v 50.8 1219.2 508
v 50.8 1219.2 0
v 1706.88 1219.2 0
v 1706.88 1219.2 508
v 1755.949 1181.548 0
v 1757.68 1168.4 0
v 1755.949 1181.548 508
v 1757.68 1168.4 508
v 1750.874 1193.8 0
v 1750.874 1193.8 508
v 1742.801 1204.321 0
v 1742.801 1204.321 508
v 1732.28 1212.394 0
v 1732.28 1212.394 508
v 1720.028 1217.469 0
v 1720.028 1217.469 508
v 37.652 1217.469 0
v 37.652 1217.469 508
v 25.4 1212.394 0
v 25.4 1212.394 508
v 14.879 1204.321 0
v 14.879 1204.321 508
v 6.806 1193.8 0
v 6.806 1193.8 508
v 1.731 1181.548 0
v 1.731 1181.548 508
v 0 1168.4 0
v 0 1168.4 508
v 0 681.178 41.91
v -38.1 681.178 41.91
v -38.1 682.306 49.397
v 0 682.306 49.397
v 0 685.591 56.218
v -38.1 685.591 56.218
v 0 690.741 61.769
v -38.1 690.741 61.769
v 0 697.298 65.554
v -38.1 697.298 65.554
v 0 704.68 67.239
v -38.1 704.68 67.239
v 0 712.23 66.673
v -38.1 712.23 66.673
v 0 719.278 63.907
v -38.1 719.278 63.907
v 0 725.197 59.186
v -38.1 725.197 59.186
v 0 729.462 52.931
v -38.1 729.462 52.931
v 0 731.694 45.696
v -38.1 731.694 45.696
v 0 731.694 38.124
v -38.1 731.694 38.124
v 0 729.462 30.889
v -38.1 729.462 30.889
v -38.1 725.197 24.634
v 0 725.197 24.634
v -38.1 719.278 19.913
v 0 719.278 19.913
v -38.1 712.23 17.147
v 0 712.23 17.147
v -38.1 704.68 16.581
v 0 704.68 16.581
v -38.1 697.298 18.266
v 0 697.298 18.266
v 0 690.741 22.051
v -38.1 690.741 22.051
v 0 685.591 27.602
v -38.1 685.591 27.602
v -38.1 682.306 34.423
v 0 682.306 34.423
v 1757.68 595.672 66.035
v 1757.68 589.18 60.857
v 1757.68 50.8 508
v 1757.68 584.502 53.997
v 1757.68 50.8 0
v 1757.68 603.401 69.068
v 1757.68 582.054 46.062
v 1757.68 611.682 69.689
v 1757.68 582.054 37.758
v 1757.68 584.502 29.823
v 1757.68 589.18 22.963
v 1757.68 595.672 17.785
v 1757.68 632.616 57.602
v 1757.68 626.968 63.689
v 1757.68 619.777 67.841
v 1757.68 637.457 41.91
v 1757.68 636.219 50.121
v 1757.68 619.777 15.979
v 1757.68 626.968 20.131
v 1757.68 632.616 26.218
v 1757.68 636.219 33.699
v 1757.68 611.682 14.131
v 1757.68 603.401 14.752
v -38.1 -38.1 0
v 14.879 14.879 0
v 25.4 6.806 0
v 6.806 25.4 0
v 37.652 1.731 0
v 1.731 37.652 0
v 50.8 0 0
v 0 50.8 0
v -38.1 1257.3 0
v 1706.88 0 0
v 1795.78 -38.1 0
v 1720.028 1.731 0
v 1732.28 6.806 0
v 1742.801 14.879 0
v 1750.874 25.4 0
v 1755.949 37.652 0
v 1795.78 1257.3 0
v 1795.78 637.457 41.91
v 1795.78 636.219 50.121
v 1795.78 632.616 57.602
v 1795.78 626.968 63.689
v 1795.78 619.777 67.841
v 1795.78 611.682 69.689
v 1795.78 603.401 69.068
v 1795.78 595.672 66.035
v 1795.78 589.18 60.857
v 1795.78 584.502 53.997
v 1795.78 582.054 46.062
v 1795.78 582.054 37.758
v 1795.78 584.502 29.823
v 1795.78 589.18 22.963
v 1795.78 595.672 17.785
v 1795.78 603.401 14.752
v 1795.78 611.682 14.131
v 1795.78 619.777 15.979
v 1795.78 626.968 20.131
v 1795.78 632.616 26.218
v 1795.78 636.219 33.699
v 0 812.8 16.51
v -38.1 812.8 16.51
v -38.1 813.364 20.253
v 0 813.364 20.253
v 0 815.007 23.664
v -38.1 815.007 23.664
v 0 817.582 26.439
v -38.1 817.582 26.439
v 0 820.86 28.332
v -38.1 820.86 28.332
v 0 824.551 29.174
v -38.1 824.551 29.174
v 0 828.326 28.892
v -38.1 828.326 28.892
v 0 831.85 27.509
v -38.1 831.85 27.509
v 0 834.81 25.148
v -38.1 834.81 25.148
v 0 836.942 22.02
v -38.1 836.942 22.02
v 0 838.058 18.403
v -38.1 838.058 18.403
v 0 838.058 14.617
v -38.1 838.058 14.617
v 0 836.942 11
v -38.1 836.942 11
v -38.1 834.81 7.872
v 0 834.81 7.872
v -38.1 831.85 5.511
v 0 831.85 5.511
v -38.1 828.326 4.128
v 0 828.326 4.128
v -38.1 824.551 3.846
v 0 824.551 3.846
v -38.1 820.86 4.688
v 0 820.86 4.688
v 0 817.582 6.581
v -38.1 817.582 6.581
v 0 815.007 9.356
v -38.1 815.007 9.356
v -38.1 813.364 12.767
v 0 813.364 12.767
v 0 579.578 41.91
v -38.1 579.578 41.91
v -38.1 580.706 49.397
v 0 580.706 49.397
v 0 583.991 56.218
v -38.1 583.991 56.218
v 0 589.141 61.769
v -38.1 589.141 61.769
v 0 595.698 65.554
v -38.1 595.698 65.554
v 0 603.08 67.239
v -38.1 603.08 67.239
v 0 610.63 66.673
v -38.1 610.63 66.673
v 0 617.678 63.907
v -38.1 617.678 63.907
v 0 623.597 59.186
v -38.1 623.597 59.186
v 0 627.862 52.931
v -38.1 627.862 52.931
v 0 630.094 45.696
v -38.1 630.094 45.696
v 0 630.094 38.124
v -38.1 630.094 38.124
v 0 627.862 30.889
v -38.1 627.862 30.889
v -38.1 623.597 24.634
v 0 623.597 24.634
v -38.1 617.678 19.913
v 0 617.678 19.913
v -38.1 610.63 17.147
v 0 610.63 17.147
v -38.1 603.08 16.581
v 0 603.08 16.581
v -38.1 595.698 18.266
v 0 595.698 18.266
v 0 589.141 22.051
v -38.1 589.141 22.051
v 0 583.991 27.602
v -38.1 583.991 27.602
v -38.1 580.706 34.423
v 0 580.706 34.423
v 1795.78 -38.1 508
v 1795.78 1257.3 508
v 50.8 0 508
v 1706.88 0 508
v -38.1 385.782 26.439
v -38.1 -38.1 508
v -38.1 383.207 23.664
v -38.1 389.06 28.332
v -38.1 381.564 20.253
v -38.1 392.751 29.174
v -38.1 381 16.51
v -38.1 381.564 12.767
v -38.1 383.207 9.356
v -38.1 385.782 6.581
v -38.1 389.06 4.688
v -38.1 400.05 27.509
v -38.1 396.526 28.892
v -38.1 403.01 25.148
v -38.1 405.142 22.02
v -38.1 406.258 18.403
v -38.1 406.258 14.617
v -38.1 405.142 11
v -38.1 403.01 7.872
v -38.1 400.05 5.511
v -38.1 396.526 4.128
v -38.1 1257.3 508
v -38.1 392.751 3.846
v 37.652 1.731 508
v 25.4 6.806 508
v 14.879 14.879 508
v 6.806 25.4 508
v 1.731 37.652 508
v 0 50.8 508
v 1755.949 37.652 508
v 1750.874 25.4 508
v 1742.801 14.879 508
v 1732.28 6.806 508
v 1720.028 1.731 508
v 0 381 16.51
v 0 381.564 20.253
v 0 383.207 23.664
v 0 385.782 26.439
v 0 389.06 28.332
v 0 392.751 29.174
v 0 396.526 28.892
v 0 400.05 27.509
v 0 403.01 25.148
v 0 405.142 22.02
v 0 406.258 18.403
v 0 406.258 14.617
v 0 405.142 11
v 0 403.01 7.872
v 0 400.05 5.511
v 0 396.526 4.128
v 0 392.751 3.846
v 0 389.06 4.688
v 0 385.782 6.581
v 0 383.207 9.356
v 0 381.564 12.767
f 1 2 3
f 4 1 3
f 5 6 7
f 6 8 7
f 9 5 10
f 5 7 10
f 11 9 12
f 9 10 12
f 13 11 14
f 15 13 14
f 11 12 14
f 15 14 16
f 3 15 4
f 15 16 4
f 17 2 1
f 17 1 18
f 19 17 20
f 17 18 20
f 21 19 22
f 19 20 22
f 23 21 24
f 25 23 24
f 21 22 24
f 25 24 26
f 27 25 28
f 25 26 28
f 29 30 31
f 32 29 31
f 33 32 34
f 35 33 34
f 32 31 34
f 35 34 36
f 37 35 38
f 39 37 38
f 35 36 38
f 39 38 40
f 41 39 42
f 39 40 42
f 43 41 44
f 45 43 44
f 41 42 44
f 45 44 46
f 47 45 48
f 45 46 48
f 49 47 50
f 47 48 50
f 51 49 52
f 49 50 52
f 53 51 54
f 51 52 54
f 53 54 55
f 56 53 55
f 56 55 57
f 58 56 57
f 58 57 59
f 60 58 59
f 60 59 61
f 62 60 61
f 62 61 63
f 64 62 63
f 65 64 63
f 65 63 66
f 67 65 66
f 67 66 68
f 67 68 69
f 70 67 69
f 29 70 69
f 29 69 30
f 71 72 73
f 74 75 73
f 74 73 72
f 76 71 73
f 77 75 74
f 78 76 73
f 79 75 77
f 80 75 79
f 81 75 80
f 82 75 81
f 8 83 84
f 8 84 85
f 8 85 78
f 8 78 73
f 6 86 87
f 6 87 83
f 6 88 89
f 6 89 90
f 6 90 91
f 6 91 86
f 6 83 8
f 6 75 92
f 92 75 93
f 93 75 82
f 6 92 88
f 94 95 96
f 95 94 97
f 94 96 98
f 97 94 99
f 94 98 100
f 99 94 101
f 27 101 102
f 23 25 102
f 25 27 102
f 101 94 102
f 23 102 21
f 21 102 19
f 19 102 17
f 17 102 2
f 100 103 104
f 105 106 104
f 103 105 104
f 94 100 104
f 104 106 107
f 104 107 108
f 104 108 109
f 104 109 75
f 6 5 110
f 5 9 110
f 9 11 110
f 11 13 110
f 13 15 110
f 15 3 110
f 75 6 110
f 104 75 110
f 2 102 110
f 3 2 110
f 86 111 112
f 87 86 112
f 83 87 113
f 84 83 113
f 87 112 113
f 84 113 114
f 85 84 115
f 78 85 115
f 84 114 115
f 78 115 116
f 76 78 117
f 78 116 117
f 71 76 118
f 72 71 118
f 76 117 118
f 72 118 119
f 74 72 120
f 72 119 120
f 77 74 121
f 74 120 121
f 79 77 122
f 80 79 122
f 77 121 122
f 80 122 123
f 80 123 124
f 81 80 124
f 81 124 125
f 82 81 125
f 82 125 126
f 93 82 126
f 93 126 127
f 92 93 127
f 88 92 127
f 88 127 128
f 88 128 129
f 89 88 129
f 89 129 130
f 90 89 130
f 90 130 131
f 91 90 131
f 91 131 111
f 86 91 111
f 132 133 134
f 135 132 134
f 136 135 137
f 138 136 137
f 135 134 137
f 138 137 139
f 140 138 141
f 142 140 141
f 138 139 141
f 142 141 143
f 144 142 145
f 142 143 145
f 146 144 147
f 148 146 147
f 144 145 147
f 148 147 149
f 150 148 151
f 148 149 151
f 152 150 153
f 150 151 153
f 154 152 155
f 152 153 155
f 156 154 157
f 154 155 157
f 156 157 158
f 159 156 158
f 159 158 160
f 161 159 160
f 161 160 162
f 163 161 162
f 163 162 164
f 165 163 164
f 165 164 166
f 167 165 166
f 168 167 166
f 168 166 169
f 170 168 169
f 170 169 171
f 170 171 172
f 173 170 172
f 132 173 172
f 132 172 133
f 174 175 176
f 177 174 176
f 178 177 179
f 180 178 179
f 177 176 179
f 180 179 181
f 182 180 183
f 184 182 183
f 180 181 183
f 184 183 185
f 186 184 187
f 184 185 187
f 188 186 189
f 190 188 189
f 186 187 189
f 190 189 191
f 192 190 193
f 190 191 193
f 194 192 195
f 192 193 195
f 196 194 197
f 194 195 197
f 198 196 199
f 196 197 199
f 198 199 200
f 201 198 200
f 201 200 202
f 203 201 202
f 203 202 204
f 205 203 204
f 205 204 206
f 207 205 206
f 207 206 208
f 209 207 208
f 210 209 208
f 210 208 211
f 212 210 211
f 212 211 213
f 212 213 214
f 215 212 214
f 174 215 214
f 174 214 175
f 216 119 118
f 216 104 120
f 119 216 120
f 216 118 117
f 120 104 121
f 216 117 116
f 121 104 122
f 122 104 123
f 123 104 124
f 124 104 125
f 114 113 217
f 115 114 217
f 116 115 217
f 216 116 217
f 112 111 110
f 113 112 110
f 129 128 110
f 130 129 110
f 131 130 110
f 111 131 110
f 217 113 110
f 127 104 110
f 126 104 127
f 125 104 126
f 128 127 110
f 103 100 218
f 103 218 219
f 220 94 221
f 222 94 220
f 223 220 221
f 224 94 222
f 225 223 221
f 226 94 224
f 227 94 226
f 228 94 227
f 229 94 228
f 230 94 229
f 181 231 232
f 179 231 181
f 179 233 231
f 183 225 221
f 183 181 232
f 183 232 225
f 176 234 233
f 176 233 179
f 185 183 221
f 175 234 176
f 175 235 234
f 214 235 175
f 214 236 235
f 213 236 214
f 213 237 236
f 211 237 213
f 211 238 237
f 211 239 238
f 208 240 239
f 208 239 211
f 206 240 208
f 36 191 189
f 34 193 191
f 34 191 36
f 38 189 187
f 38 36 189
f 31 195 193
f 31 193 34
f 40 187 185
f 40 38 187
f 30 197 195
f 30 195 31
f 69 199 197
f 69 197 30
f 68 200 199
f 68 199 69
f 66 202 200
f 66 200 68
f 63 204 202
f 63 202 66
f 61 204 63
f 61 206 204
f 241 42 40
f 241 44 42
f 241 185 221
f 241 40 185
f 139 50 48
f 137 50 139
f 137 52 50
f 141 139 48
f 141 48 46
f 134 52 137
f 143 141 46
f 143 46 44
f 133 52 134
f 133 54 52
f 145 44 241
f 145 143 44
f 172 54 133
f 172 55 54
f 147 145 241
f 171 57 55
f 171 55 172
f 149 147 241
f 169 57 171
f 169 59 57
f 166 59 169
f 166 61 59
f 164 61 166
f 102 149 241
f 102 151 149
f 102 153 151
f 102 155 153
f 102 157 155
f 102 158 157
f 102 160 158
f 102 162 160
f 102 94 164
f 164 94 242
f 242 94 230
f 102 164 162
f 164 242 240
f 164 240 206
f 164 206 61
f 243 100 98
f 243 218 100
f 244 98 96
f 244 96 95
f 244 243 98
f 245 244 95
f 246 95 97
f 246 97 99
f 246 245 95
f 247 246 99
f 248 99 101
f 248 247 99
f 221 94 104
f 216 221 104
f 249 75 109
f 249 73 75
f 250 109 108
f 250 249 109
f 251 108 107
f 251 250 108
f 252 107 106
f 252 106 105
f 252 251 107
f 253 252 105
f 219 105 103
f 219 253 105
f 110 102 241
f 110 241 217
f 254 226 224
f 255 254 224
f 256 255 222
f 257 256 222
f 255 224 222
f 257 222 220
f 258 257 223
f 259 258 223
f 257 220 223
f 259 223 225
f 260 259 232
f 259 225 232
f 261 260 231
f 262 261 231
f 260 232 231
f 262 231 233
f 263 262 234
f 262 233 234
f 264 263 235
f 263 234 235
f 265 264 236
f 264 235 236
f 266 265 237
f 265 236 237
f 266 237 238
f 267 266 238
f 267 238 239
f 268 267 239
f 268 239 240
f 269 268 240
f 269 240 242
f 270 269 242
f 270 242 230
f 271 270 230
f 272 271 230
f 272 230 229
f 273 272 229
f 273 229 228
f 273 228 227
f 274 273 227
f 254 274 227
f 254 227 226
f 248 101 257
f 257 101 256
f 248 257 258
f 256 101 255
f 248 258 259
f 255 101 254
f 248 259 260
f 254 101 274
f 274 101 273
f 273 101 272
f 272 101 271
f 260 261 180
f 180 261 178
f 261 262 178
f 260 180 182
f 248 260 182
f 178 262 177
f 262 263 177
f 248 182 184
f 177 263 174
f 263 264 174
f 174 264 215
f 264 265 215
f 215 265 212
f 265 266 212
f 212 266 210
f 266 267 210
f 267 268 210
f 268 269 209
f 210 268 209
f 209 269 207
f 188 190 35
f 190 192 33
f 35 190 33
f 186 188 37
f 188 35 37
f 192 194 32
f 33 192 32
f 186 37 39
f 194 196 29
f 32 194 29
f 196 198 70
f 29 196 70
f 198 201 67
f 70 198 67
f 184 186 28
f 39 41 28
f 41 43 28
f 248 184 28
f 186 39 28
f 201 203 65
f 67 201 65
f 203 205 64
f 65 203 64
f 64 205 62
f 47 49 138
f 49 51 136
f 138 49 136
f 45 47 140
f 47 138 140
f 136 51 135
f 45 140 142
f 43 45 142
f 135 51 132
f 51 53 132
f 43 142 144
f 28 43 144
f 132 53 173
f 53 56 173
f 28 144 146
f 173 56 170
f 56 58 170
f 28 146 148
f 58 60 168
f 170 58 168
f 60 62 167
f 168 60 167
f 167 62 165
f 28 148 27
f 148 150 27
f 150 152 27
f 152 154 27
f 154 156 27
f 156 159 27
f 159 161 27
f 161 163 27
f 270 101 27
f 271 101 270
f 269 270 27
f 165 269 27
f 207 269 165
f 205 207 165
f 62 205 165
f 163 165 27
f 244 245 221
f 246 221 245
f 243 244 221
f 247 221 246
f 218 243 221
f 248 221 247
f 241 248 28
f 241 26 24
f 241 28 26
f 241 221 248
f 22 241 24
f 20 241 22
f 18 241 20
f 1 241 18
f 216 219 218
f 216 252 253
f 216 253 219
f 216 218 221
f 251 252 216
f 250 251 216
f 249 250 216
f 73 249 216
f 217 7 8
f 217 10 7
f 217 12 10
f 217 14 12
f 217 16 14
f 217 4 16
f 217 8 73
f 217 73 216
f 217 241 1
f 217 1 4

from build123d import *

# Parameters (mm, degrees)
F0_W      = 1833.88
F0_H      = 1295.4
F0_W_2    = 1757.68
F0_H_2    = 1219.2
F1_DEPTH  = 508
F2_R      = 50.8
F3_R      = 50.8
F4_R      = 50.8
F5_R      = 50.8
F6_R      = 25.4
F8_DEPTH  = 50.8
F7_R      = 12.7
F9_DEPTH  = 50.8
F10_R     = 27.856725
F11_DEPTH = 50.8


with BuildPart() as f1:
    # F0 (on Top) → F1 (new body)
    with BuildSketch(Plane.XY):
        with Locations((878.84, 609.6)):
            Rectangle(F0_W, F0_H)
        with Locations((878.84, 609.6)):
            Rectangle(F0_W_2, F0_H_2, mode=Mode.SUBTRACT)
    extrude(amount=F1_DEPTH)

    # F2
    f2_edges = [f1.edges().sort_by_distance(p)[0] for p in [
        (1757.68, 1219.2, 254),
    ]]
    fillet(f2_edges, radius=F2_R)

    # F3
    f3_edges = [f1.edges().sort_by_distance(p)[0] for p in [
        (0, 1219.2, 254),
    ]]
    fillet(f3_edges, radius=F3_R)

    # F4
    f4_edges = [f1.edges().sort_by_distance(p)[0] for p in [
        (1757.68, 0, 254),
    ]]
    fillet(f4_edges, radius=F4_R)

    # F5
    f5_edges = [f1.edges().sort_by_distance(p)[0] for p in [
        (0, 0, 254),
    ]]
    fillet(f5_edges, radius=F5_R)

    # F6 (on face) → F8 (cut)
    with BuildSketch(Plane(origin=(-38.1, 0, 0), x_dir=(0, -1, 0), z_dir=(-1, 0, 0))):
        with Locations((-604.977846, 41.91)):
            Circle(F6_R)
        with Locations((-706.577846, 41.91)):
            Circle(F6_R)
    extrude(amount=-F8_DEPTH, mode=Mode.SUBTRACT)

    # F7 (on face) → F9 (cut)
    with BuildSketch(Plane(origin=(-38.1, 0, 0), x_dir=(0, -1, 0), z_dir=(-1, 0, 0))):
        with Locations((-393.7, 16.51)):
            Circle(F7_R)
        with Locations((-825.5, 16.51)):
            Circle(F7_R)
    extrude(amount=-F9_DEPTH, mode=Mode.SUBTRACT)

    # F10 (on face) → F11 (cut)
    with BuildSketch(Plane.YZ.offset(1795.78)):
        with Locations((609.6, 41.91)):
            Circle(F10_R)
    extrude(amount=-F11_DEPTH, mode=Mode.SUBTRACT)


solid = f1.part
